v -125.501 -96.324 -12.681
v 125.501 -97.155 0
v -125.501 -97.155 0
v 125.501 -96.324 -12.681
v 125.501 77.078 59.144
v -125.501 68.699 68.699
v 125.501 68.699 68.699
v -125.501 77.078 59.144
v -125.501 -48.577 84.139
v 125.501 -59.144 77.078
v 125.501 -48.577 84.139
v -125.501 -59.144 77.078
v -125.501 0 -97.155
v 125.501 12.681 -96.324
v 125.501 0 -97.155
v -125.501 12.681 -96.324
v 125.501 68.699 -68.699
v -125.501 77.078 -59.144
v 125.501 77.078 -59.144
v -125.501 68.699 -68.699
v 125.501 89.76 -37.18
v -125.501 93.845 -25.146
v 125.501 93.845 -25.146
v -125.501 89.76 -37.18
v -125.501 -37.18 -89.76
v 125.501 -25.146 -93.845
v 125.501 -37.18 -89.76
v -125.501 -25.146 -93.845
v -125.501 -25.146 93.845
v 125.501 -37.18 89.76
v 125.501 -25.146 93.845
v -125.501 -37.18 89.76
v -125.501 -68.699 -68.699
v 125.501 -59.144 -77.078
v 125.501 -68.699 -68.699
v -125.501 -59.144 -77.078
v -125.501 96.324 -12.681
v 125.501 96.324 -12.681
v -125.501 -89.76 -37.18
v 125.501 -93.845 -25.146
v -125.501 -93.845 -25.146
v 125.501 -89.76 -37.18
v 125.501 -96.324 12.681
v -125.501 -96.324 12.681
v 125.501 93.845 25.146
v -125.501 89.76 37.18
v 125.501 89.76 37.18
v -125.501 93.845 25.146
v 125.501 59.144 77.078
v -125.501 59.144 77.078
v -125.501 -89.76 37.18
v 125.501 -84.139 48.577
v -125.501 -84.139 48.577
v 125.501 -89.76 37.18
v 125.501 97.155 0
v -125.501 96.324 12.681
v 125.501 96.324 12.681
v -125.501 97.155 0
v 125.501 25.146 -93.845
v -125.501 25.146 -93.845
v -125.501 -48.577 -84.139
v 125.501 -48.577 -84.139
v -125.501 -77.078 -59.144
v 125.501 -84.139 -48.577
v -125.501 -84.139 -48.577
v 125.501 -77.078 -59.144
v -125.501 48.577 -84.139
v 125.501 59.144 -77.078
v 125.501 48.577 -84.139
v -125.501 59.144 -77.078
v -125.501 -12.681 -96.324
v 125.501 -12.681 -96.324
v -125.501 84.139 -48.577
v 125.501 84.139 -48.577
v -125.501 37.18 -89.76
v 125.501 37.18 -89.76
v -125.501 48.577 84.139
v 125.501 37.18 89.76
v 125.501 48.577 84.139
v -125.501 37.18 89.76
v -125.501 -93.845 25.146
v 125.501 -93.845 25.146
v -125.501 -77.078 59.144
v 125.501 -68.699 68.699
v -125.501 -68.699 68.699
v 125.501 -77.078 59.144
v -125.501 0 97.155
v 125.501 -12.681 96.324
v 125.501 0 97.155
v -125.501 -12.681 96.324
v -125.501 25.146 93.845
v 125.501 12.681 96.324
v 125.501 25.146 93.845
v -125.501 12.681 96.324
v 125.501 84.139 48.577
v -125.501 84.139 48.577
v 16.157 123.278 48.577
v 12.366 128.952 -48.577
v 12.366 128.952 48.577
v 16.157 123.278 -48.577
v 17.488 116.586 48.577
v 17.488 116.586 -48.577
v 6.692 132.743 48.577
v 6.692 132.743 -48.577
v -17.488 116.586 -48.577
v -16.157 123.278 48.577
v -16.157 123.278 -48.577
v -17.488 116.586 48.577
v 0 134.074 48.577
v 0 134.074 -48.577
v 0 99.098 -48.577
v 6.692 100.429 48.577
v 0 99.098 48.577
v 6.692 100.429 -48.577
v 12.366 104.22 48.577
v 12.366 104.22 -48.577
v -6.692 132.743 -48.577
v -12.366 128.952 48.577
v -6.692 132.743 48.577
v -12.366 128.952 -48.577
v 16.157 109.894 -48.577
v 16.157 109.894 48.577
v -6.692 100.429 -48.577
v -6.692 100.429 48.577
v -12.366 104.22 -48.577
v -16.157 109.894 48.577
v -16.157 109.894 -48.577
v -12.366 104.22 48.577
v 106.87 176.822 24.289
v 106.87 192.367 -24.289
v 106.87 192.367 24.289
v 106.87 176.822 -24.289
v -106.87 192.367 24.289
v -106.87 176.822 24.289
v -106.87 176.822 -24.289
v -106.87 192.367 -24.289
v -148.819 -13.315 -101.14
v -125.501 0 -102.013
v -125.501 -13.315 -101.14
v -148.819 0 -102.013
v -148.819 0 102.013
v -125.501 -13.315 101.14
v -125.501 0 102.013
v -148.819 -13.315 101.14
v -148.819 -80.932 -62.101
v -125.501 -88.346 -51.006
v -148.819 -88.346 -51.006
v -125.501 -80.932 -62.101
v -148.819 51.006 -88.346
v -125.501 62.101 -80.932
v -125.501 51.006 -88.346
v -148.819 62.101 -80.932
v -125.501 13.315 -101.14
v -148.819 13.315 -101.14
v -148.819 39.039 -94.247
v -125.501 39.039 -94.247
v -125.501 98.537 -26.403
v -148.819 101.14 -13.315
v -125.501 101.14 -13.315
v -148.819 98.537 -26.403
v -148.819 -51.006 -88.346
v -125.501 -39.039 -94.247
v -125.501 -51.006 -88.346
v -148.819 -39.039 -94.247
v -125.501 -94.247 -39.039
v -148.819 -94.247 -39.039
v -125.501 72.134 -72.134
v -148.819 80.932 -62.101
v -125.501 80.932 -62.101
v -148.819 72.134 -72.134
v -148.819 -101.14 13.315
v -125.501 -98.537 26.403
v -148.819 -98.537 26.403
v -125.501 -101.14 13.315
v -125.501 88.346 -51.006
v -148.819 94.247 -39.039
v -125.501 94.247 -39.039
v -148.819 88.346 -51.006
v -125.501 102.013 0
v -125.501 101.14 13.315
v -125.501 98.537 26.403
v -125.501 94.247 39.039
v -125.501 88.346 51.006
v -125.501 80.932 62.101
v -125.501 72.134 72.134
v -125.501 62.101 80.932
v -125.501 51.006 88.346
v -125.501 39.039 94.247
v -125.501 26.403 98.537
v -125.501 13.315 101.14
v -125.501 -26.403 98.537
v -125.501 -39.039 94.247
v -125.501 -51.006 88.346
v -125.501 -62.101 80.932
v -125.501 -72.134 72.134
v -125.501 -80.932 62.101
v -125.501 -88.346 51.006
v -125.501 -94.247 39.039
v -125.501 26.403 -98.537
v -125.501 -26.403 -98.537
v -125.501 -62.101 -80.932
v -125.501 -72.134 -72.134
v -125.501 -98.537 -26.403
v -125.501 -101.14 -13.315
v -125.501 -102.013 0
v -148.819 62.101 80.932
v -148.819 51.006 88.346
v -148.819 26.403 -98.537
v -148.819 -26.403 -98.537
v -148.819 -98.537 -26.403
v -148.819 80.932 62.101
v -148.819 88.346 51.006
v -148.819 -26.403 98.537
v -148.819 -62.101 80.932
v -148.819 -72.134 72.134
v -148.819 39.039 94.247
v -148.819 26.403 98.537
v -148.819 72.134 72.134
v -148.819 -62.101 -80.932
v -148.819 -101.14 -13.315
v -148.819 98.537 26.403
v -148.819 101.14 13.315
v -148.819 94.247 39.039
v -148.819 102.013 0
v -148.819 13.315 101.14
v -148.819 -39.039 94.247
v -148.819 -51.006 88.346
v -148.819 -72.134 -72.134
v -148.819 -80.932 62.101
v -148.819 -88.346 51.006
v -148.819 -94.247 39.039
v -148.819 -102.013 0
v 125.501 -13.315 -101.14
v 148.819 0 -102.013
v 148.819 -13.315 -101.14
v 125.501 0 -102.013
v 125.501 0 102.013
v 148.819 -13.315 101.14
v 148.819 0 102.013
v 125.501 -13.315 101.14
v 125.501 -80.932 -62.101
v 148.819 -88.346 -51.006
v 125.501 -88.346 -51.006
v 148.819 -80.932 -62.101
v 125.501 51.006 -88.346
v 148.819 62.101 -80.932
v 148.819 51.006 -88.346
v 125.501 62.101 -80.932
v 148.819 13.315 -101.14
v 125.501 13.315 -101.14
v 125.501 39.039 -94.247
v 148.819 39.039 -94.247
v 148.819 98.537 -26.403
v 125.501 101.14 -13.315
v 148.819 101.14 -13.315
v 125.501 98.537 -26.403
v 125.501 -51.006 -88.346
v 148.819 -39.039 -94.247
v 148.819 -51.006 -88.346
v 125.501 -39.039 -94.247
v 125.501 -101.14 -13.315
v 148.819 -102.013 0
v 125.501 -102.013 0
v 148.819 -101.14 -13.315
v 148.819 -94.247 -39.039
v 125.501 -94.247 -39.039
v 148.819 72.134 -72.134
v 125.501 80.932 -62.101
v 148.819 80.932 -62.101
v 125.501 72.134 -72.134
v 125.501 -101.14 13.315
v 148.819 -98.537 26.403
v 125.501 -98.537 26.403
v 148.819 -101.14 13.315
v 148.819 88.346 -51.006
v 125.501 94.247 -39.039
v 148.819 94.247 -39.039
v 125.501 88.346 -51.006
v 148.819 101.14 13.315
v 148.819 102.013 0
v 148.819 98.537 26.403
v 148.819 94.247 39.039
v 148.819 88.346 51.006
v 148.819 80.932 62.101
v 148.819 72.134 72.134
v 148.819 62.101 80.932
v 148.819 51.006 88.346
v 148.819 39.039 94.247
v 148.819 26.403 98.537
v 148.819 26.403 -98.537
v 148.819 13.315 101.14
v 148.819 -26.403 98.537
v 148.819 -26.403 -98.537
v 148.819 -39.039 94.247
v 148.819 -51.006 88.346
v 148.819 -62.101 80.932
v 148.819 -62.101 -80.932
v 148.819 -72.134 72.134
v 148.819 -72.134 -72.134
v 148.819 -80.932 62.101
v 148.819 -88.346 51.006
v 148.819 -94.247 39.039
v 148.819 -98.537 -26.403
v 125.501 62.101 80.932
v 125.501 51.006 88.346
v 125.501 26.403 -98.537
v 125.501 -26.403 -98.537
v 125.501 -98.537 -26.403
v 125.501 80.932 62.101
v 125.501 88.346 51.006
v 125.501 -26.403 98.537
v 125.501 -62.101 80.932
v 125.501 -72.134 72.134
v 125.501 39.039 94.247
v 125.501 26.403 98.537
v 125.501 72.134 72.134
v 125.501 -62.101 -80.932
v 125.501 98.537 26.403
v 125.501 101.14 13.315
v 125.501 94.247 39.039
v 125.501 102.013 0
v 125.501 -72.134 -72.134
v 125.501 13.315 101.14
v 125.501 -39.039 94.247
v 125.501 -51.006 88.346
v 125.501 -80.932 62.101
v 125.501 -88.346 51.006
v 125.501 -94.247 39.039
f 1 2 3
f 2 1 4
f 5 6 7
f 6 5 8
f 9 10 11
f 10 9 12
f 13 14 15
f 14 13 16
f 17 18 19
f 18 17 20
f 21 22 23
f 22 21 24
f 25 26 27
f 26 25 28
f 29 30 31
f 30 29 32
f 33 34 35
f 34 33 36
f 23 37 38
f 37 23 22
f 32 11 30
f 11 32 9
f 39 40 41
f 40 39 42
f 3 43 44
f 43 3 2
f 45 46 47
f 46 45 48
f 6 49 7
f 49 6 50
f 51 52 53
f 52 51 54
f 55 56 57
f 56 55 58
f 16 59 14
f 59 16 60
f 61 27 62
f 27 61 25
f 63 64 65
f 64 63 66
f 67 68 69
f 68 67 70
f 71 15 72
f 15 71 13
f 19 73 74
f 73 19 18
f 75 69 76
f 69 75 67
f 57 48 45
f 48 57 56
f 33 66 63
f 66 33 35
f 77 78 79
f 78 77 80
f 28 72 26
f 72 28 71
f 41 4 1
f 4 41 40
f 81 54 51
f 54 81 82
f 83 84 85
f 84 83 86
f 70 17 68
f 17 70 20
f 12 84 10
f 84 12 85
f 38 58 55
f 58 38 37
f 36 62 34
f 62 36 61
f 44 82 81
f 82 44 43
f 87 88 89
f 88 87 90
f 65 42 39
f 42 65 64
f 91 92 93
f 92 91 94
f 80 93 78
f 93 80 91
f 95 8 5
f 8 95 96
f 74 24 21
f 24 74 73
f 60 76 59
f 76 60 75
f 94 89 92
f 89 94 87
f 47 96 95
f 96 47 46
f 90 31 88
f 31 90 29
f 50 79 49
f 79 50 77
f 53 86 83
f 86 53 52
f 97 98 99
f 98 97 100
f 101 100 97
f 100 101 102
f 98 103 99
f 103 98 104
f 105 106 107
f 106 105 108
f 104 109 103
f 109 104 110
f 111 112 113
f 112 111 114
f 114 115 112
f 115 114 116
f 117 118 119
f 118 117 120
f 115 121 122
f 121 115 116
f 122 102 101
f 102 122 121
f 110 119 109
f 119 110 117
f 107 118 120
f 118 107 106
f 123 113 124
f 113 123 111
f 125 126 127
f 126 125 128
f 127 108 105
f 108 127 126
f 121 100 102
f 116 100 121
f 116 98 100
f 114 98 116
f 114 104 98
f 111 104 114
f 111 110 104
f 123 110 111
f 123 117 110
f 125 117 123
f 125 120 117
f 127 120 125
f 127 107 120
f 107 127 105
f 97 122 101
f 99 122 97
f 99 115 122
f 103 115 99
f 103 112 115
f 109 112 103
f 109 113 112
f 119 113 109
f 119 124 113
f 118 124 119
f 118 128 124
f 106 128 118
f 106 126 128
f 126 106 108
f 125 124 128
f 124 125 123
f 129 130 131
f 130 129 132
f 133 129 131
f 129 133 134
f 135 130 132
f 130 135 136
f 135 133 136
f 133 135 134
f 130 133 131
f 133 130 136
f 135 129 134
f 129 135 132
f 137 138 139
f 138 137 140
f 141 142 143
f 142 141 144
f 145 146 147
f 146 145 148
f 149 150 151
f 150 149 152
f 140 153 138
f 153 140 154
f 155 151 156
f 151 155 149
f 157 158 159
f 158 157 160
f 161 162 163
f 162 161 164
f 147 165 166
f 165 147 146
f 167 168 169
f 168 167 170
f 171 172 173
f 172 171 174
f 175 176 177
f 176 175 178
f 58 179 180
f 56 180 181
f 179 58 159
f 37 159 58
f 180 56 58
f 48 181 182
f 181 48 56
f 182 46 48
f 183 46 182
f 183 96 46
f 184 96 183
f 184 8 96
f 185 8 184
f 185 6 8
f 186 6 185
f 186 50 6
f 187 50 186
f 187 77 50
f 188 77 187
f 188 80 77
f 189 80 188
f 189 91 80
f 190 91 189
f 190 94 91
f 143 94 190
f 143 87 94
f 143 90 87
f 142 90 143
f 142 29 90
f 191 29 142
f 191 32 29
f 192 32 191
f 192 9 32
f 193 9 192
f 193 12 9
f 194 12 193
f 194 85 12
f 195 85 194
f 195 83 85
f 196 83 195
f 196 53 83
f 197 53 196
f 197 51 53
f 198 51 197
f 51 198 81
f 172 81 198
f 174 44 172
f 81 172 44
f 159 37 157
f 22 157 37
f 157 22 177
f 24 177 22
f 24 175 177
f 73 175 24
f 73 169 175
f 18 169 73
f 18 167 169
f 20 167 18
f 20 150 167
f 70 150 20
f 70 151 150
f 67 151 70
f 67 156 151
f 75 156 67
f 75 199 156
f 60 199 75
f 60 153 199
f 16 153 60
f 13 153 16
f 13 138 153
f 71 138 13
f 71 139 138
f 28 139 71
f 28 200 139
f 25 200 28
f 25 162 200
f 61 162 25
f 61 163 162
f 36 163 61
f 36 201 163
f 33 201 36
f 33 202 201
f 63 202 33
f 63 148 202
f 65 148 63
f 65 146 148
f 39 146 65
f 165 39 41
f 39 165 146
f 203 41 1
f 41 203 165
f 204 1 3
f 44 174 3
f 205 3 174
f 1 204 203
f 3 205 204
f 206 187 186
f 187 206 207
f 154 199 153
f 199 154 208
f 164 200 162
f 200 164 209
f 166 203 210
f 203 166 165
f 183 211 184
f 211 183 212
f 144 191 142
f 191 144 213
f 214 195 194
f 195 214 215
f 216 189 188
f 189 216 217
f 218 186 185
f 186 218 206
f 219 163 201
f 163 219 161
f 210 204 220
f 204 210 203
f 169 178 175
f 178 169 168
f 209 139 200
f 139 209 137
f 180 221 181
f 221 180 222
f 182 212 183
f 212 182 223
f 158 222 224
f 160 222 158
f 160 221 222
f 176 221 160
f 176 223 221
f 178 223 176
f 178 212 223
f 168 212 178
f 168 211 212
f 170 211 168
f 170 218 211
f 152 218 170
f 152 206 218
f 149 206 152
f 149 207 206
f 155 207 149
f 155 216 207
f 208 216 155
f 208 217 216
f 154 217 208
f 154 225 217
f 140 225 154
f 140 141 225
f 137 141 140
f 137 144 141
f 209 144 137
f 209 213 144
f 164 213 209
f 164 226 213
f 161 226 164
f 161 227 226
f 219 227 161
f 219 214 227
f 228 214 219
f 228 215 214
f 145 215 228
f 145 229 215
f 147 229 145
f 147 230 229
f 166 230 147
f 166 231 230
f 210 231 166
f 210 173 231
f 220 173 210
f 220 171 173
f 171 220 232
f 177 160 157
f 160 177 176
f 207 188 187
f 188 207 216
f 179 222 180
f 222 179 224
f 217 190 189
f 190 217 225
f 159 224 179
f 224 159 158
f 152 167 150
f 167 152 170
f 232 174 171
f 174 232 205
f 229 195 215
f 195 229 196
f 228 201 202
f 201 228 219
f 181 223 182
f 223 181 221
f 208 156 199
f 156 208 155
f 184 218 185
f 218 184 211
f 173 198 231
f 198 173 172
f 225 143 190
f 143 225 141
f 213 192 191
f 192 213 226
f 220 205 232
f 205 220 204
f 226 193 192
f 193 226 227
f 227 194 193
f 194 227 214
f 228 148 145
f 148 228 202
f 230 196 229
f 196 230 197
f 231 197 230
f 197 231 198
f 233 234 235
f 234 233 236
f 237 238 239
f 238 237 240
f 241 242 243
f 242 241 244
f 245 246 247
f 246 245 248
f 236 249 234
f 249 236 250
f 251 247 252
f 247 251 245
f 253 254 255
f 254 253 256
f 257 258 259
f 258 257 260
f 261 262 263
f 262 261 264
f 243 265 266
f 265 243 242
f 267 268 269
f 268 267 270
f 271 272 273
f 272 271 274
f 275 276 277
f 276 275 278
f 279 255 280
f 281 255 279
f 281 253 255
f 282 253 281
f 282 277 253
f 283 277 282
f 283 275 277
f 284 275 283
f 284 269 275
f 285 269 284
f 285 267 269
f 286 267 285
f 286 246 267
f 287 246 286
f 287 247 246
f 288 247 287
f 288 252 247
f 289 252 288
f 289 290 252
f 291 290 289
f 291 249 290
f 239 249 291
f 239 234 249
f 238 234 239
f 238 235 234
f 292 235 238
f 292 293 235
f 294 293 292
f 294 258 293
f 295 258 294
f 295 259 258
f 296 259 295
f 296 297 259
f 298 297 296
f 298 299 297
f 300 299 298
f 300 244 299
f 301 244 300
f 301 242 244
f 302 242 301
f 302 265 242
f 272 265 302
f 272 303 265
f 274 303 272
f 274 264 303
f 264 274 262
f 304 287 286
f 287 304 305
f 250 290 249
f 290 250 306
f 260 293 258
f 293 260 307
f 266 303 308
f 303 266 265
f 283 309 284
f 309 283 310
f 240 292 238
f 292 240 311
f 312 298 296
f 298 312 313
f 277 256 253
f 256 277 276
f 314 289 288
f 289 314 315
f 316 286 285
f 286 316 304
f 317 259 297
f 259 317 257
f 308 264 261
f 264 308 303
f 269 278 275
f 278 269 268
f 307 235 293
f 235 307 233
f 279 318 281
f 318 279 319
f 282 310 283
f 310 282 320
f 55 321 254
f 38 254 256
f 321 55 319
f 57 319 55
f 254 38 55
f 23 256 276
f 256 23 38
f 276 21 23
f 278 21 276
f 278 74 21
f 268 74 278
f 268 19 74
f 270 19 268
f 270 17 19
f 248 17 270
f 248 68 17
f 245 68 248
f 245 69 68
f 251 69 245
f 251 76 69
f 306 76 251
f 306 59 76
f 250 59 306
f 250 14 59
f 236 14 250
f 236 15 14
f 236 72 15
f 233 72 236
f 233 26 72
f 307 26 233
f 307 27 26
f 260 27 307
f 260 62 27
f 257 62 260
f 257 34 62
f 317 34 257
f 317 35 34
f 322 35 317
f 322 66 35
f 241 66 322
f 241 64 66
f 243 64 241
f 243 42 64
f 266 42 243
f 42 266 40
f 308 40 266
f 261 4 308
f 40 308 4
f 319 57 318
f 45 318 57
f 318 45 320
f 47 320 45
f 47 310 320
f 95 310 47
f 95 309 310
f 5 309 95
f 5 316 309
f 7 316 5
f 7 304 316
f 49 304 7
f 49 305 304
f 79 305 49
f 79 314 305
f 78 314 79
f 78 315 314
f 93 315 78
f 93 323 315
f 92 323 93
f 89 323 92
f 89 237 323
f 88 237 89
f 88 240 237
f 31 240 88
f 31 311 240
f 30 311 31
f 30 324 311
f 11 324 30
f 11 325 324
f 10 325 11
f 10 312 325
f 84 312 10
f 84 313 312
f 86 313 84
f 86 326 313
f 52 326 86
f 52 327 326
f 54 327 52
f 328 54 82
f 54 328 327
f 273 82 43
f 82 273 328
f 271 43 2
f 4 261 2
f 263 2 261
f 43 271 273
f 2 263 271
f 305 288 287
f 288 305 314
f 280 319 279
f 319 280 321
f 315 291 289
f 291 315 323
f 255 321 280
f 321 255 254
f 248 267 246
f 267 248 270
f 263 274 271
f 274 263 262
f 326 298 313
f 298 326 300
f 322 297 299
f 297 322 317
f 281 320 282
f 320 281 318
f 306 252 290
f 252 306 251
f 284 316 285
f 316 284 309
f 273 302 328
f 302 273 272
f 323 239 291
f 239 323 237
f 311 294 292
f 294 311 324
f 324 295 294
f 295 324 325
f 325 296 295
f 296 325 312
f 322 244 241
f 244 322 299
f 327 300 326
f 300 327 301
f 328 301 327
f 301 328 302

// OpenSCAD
// Auto-generated by scripts/author_from_manifest.py (Phase D.3).
// Source: data/phase_d_manifest.json (sku_intent='viking-model-g-preaction-4in').
// Do not hand-edit — regenerate from the manifest.
//
// @part viking_model_g_preaction_4in
// @kind valve
// @category valve.preaction
// @display-name "Viking Model G Preaction Valve 4\""
// @mfg viking_group
// @mfg-pn Model_G
// @listing UL FM
// @price-usd 1750.00
// @install-minutes 90
// @crew foreman
// @param size_in number default=4 label="Size" unit="in"
// @port inlet position=[-0.05,0,0] direction=[-1,0,0] style=grooved size_in=4 role=run_a
// @port outlet position=[0.05,0,0] direction=[1,0,0] style=grooved size_in=4 role=run_b

size_in = 4.0;

function od_mm(nps) =
    nps ==   1  ? 33.4 :
    nps == 1.25 ? 42.2 :
    nps == 1.5  ? 48.3 :
    nps ==   2  ? 60.3 :
    nps == 2.5  ? 73.0 :
    nps ==   3  ? 88.9 :
    nps ==   4  ? 114.3 :
    nps ==   6  ? 168.3 :
    nps ==   8  ? 219.1 : 73.0;

od = od_mm(size_in);
body_len = od * 2.4;
body_d   = od * 1.7;

union() {
    // Valve body
    rotate([0, 90, 0])
        cylinder(h = body_len, d = body_d, center = true, $fn = 48);
    // Stem / handle indicator
    translate([0, body_d * 0.6, 0])
        cylinder(h = body_d * 0.5, d = body_d * 0.18, center = true, $fn = 16);
    translate([0, body_d * 0.95, 0])
        cube([body_d * 1.1, body_d * 0.08, body_d * 0.25], center = true);
    // End flanges
    translate([-body_len/2, 0, 0])
        rotate([0, 90, 0])
        cylinder(h = body_d * 0.12, d = body_d * 1.05, center = true, $fn = 48);
    translate([ body_len/2, 0, 0])
        rotate([0, 90, 0])
        cylinder(h = body_d * 0.12, d = body_d * 1.05, center = true, $fn = 48);
}
